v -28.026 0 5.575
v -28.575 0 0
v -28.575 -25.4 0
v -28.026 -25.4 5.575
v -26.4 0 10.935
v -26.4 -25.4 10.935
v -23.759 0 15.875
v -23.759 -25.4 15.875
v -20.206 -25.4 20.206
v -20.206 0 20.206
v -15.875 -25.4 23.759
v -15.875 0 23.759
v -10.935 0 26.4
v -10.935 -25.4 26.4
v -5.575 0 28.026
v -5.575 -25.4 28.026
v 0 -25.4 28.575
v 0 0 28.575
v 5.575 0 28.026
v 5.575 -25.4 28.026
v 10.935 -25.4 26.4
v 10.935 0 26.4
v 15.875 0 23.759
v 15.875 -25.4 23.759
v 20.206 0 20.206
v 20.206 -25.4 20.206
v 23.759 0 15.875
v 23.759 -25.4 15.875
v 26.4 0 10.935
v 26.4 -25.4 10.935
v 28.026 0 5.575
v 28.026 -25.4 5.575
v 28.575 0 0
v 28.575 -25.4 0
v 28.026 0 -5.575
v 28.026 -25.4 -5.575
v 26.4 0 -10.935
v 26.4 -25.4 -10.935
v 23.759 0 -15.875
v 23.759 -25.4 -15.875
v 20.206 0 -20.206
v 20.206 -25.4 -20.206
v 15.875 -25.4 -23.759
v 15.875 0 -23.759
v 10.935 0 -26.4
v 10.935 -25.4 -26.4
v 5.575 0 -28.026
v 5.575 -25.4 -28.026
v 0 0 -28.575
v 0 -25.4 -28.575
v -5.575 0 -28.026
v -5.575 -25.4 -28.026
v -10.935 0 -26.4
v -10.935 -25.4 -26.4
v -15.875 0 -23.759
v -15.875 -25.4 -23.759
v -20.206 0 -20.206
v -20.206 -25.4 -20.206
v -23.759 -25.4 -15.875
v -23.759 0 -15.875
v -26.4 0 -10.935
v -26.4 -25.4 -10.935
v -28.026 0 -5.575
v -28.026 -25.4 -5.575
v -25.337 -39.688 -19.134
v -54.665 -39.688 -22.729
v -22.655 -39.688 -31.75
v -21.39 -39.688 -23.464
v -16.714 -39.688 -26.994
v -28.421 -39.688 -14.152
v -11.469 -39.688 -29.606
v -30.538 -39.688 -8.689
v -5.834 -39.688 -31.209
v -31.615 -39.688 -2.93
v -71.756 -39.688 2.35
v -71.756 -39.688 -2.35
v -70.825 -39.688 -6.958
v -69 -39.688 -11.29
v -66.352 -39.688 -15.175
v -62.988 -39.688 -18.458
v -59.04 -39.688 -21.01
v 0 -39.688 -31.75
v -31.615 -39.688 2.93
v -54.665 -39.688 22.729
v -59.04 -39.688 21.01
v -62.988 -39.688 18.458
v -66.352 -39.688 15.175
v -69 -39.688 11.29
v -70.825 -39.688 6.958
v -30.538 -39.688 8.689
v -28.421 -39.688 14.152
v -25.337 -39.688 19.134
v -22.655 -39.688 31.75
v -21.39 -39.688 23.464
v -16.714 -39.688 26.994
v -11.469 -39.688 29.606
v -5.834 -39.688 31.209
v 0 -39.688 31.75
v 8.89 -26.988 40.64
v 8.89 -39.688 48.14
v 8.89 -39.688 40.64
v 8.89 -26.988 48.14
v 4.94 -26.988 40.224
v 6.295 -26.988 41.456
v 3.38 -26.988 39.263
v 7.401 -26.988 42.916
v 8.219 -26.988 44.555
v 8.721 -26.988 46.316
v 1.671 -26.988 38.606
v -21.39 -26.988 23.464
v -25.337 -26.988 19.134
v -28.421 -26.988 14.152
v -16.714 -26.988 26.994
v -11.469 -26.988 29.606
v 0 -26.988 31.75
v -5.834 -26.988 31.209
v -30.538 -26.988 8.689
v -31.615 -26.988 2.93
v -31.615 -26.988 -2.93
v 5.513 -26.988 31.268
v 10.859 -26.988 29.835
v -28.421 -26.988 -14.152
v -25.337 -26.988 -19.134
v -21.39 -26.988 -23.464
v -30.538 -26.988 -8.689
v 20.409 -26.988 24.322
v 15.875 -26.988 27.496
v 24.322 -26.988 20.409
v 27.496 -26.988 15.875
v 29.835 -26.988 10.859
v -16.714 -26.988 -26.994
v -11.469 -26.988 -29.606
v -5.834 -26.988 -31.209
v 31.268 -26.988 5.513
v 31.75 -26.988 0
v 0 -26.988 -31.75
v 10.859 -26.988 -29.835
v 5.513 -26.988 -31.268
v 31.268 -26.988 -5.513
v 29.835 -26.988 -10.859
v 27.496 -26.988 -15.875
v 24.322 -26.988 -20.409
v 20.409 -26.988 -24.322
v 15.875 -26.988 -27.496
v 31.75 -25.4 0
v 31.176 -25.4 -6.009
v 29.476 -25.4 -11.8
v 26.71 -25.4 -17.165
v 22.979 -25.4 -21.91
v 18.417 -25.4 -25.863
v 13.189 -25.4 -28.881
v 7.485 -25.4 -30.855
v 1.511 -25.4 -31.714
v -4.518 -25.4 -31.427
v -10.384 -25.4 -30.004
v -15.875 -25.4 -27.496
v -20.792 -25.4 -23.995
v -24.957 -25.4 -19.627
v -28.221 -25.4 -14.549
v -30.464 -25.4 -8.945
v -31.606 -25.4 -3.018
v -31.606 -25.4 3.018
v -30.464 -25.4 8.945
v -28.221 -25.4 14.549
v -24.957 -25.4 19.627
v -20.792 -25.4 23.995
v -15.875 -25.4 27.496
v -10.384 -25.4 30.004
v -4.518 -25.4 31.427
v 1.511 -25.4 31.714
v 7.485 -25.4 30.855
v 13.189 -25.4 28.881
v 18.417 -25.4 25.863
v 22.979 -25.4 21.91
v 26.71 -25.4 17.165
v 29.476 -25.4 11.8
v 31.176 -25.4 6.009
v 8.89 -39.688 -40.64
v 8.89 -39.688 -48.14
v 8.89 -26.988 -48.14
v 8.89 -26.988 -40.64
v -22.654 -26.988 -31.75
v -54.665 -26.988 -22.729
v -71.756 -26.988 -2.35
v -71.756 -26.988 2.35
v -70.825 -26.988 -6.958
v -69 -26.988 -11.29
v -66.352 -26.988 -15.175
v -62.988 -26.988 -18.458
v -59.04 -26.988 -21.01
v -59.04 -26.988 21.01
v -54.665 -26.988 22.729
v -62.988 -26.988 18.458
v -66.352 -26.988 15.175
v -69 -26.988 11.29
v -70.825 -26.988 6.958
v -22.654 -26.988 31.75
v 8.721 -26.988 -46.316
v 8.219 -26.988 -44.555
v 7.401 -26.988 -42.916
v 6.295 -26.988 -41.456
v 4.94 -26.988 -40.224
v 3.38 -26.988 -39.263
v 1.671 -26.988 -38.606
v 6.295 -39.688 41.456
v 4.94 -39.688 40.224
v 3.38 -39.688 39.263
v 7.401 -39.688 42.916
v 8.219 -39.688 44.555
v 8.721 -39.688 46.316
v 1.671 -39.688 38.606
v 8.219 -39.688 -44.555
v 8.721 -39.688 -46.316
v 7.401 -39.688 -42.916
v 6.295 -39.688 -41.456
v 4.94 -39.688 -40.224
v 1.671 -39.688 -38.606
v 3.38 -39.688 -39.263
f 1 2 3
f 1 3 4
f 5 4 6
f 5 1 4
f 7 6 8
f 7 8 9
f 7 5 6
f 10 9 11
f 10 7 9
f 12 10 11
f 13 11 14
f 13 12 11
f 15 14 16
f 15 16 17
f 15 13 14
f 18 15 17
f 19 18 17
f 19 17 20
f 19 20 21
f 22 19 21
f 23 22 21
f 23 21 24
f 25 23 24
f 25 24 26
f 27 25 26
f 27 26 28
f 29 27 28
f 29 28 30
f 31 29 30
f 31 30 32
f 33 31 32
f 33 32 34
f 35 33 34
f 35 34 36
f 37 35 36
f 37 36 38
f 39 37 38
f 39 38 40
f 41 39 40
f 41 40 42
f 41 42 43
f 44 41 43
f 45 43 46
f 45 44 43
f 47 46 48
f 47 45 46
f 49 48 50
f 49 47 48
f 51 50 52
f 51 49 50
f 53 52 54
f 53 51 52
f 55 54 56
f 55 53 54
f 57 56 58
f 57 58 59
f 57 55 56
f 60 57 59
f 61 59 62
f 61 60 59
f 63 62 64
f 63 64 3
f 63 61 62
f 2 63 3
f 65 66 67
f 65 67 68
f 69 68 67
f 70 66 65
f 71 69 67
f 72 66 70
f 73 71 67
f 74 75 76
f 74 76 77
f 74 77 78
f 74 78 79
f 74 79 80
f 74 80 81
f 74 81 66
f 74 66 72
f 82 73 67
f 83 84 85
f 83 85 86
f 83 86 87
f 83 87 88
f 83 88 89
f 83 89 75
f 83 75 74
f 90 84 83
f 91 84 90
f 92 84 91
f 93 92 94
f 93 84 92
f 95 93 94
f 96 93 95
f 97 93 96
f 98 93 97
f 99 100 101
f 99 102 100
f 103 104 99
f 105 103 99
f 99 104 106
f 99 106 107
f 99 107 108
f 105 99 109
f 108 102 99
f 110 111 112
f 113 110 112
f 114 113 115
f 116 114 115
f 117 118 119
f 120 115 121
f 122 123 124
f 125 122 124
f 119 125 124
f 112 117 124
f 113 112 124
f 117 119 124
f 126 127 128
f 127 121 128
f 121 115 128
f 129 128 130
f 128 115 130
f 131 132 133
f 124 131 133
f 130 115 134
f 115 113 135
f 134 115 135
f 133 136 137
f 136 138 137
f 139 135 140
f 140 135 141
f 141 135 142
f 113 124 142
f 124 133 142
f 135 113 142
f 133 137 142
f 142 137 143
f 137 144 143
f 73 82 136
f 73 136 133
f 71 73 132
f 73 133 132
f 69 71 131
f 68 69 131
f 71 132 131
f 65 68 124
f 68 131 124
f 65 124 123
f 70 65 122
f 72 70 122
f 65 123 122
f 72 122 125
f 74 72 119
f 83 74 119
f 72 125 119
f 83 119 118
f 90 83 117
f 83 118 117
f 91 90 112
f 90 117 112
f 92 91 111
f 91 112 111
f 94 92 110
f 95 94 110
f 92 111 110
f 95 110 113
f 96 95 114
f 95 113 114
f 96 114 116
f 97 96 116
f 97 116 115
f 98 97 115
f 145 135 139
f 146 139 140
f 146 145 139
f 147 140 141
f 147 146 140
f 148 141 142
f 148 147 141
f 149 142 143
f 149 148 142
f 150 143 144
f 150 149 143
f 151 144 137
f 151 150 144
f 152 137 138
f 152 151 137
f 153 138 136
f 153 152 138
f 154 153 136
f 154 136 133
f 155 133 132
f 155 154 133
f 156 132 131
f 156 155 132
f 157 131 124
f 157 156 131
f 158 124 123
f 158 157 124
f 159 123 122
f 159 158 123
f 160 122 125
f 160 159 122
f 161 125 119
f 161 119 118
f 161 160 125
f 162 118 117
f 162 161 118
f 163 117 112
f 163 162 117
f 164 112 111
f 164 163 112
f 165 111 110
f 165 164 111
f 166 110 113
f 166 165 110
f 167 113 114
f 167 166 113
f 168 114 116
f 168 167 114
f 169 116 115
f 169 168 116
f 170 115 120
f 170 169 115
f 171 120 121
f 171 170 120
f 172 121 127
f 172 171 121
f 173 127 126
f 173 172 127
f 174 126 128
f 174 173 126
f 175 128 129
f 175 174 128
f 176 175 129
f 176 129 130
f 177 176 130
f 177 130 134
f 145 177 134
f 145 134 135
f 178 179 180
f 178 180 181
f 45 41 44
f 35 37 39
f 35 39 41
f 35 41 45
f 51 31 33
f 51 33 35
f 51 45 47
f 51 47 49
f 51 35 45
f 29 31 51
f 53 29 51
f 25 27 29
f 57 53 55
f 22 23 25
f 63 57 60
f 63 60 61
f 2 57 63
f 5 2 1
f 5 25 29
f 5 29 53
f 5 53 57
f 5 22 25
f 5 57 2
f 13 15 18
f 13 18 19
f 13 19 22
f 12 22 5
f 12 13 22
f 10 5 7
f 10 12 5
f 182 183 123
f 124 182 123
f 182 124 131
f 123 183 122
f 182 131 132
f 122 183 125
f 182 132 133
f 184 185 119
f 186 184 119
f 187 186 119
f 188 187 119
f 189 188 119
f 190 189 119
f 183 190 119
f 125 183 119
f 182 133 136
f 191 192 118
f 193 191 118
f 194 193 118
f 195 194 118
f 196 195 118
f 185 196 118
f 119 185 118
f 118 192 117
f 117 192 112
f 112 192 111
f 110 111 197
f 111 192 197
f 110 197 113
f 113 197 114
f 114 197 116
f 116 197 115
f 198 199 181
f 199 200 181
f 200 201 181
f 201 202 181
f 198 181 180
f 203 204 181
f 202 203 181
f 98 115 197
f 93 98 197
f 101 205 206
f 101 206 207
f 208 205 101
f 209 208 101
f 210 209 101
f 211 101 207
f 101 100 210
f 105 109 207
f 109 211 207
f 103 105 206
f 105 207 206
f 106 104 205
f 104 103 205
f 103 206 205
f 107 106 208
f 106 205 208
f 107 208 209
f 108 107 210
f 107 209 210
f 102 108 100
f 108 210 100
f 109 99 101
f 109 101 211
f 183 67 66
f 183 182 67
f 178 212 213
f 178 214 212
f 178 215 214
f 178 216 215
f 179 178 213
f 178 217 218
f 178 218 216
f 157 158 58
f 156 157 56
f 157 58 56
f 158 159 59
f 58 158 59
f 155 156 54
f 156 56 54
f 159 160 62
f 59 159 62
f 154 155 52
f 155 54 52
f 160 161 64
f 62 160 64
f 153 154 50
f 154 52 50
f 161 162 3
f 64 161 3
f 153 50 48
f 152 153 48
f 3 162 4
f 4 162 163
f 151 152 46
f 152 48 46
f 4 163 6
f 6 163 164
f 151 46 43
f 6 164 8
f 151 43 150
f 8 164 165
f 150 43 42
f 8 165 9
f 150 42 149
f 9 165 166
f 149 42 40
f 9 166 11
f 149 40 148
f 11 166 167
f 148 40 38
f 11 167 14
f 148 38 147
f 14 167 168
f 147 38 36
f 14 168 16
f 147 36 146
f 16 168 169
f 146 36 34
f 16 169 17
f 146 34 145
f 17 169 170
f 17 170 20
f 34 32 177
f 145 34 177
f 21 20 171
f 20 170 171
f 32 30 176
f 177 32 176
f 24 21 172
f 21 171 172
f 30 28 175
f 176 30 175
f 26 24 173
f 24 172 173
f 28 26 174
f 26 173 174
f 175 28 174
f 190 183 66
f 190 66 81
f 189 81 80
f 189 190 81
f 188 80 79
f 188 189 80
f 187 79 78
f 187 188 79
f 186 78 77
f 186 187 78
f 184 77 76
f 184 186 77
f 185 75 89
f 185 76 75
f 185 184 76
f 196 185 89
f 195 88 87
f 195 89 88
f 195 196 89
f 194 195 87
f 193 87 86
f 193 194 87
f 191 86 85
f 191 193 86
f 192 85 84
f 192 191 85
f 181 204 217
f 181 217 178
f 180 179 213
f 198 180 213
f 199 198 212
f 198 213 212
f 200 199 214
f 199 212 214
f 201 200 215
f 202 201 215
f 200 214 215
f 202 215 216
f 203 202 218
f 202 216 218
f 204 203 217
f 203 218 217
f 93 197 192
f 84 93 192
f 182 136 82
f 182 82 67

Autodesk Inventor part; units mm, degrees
ref_plane "YZ Plane" through (0, 0, 0) normal (1, 0, 0) x (0, 1, 0)
ref_plane "XZ Plane" through (0, 0, 0) normal (0, 1, 0) x (-1, 0, 0)
ref_plane "XY Plane" through (0, 0, 0) normal (0, 0, 1) x (1, 0, 0)
sketch "Sketch2" plane through (0, 0, 0) normal (0, 1, 0) x (-1, 0, 0)
  circle A0 centre (0, 0) radius 28.575
  dimension "d0" = 57.15
extrude "Extrusion1" add sketch "Sketch2" against normal blind 25.4
sketch "Sketch3" plane through (0, -25.4, 0) normal (0, -1, 0) x (1, 0, 0)
  circle A0 centre (0, 0) radius 31.75
  dimension "d3" = 63.5
extrude "Extrusion2" add sketch "Sketch3" along normal blind 1.5875
sketch "Sketch4" plane through (0, -26.9875, 0) normal (0, -1, 0) x (1, 0, 0)
  arc A0 (8.89, -56.9095) -> (8.89, 57.3905) centre (8.89, 0.2405) ccw
  arc A1 (-54.665, 22.7287) -> (-54.665, -22.7287) centre (-48.2595, 0) ccw
  line L0 (8.89, -56.9095) -> (8.89, 57.3905) construction
  line L1 (8.89, -40.64) -> (-54.665, -22.7287)
  line L2 (0, 0) -> (66.0395, 0) construction
  line L3 (8.89, 40.64) -> (-54.665, 22.7287)
  line L4 (8.89, 40.64) -> (8.89, 57.3905)
  line L5 (8.89, -40.64) -> (8.89, -56.9095)
  circle A2 centre (0, 0) radius 28.575
  line L6 (18.7922, 40.64) -> (8.89, 40.64)
  line L7 (8.89, -40.64) -> (18.7922, -40.64)
  arc A3 (18.7922, -40.64) -> (18.7922, 40.64) centre (0.7869, 0) ccw
  line L8 (18.7922, 40.64) -> (18.7922, 56.5261)
  line L9 (18.7922, -56.045) -> (18.7922, -40.64)
  line L10 (18.7922, -21.5263) -> (18.7922, 21.5263)
  point P0 (-61.1412, -20.9035)
  point P1 (38.37, -48.7192)
  point P2 (-61.1412, 20.9035)
  dimension "d6" = 114.3
  dimension "d7" = 47.2281
  dimension "d8" = 57.15
  dimension "d11" = 81.28
  dimension "d30" = 44.45
extrude "Extrusion3" add sketch "Sketch4" along normal blind 12.7 contours L5 L7 L9 A0 | L9 A3 L8 A0 | L1 A1 L3 L6 A3 L7 | L8 L6 L4 A0 | A2 L10 | L10 A2
fillet "Fillet1" radius 9.906 1 edges at (8.89, -33.3375, 40.64)
fillet "Fillet2" radius 9.906 1 edges at (8.89, -33.3375, -40.64)
sketch "Sketch10" plane through (0, -26.9875, 0) normal (0, 1, 0) x (1, 0, 0)
  circle A0 centre (0, 0) radius 31.75 projected
  line L0 (0, -31.75) -> (-22.6545, -31.75)
  line L1 (1.6711, -38.6055) -> (-54.665, -22.7287) construction
  line L2 (0, -38.1346) -> (-54.665, -22.7287) construction
  line L3 (0, 31.75) -> (-22.6545, 31.75)
  line L4 (-54.665, 22.7287) -> (1.6711, 38.6055) construction
  line L5 (0, 38.1346) -> (-51.396, 23.65) construction
  line L6 (-22.6545, 31.75) -> (8.89, 40.64)
  arc A1 (8.89, -57.3905) -> (8.89, 56.9095) centre (8.89, -0.2405) ccw projected
  line L7 (8.89, 56.9095) -> (8.89, 40.64)
  line L8 (8.89, 40.64) -> (-22.6545, 31.75)
  line L9 (0, -31.75) -> (-22.6545, -31.75)
  line L10 (8.89, -40.64) -> (-22.6545, -31.75)
  line L11 (8.89, -57.3905) -> (8.89, -40.64)
  line L12 (8.89, 48.1401) -> (8.89, 56.9095) projected
  arc A2 (8.89, -57.3905) -> (8.89, 56.9095) centre (8.89, -0.2405) ccw
  arc A3 (0, -31.75) -> (0, 31.75) centre (0, 0) ccw
  point P0 (0, 0)
extrude "Extrusion9" cut sketch "Sketch10" against normal blind 25.4
properties part number "new_cigueñal"
